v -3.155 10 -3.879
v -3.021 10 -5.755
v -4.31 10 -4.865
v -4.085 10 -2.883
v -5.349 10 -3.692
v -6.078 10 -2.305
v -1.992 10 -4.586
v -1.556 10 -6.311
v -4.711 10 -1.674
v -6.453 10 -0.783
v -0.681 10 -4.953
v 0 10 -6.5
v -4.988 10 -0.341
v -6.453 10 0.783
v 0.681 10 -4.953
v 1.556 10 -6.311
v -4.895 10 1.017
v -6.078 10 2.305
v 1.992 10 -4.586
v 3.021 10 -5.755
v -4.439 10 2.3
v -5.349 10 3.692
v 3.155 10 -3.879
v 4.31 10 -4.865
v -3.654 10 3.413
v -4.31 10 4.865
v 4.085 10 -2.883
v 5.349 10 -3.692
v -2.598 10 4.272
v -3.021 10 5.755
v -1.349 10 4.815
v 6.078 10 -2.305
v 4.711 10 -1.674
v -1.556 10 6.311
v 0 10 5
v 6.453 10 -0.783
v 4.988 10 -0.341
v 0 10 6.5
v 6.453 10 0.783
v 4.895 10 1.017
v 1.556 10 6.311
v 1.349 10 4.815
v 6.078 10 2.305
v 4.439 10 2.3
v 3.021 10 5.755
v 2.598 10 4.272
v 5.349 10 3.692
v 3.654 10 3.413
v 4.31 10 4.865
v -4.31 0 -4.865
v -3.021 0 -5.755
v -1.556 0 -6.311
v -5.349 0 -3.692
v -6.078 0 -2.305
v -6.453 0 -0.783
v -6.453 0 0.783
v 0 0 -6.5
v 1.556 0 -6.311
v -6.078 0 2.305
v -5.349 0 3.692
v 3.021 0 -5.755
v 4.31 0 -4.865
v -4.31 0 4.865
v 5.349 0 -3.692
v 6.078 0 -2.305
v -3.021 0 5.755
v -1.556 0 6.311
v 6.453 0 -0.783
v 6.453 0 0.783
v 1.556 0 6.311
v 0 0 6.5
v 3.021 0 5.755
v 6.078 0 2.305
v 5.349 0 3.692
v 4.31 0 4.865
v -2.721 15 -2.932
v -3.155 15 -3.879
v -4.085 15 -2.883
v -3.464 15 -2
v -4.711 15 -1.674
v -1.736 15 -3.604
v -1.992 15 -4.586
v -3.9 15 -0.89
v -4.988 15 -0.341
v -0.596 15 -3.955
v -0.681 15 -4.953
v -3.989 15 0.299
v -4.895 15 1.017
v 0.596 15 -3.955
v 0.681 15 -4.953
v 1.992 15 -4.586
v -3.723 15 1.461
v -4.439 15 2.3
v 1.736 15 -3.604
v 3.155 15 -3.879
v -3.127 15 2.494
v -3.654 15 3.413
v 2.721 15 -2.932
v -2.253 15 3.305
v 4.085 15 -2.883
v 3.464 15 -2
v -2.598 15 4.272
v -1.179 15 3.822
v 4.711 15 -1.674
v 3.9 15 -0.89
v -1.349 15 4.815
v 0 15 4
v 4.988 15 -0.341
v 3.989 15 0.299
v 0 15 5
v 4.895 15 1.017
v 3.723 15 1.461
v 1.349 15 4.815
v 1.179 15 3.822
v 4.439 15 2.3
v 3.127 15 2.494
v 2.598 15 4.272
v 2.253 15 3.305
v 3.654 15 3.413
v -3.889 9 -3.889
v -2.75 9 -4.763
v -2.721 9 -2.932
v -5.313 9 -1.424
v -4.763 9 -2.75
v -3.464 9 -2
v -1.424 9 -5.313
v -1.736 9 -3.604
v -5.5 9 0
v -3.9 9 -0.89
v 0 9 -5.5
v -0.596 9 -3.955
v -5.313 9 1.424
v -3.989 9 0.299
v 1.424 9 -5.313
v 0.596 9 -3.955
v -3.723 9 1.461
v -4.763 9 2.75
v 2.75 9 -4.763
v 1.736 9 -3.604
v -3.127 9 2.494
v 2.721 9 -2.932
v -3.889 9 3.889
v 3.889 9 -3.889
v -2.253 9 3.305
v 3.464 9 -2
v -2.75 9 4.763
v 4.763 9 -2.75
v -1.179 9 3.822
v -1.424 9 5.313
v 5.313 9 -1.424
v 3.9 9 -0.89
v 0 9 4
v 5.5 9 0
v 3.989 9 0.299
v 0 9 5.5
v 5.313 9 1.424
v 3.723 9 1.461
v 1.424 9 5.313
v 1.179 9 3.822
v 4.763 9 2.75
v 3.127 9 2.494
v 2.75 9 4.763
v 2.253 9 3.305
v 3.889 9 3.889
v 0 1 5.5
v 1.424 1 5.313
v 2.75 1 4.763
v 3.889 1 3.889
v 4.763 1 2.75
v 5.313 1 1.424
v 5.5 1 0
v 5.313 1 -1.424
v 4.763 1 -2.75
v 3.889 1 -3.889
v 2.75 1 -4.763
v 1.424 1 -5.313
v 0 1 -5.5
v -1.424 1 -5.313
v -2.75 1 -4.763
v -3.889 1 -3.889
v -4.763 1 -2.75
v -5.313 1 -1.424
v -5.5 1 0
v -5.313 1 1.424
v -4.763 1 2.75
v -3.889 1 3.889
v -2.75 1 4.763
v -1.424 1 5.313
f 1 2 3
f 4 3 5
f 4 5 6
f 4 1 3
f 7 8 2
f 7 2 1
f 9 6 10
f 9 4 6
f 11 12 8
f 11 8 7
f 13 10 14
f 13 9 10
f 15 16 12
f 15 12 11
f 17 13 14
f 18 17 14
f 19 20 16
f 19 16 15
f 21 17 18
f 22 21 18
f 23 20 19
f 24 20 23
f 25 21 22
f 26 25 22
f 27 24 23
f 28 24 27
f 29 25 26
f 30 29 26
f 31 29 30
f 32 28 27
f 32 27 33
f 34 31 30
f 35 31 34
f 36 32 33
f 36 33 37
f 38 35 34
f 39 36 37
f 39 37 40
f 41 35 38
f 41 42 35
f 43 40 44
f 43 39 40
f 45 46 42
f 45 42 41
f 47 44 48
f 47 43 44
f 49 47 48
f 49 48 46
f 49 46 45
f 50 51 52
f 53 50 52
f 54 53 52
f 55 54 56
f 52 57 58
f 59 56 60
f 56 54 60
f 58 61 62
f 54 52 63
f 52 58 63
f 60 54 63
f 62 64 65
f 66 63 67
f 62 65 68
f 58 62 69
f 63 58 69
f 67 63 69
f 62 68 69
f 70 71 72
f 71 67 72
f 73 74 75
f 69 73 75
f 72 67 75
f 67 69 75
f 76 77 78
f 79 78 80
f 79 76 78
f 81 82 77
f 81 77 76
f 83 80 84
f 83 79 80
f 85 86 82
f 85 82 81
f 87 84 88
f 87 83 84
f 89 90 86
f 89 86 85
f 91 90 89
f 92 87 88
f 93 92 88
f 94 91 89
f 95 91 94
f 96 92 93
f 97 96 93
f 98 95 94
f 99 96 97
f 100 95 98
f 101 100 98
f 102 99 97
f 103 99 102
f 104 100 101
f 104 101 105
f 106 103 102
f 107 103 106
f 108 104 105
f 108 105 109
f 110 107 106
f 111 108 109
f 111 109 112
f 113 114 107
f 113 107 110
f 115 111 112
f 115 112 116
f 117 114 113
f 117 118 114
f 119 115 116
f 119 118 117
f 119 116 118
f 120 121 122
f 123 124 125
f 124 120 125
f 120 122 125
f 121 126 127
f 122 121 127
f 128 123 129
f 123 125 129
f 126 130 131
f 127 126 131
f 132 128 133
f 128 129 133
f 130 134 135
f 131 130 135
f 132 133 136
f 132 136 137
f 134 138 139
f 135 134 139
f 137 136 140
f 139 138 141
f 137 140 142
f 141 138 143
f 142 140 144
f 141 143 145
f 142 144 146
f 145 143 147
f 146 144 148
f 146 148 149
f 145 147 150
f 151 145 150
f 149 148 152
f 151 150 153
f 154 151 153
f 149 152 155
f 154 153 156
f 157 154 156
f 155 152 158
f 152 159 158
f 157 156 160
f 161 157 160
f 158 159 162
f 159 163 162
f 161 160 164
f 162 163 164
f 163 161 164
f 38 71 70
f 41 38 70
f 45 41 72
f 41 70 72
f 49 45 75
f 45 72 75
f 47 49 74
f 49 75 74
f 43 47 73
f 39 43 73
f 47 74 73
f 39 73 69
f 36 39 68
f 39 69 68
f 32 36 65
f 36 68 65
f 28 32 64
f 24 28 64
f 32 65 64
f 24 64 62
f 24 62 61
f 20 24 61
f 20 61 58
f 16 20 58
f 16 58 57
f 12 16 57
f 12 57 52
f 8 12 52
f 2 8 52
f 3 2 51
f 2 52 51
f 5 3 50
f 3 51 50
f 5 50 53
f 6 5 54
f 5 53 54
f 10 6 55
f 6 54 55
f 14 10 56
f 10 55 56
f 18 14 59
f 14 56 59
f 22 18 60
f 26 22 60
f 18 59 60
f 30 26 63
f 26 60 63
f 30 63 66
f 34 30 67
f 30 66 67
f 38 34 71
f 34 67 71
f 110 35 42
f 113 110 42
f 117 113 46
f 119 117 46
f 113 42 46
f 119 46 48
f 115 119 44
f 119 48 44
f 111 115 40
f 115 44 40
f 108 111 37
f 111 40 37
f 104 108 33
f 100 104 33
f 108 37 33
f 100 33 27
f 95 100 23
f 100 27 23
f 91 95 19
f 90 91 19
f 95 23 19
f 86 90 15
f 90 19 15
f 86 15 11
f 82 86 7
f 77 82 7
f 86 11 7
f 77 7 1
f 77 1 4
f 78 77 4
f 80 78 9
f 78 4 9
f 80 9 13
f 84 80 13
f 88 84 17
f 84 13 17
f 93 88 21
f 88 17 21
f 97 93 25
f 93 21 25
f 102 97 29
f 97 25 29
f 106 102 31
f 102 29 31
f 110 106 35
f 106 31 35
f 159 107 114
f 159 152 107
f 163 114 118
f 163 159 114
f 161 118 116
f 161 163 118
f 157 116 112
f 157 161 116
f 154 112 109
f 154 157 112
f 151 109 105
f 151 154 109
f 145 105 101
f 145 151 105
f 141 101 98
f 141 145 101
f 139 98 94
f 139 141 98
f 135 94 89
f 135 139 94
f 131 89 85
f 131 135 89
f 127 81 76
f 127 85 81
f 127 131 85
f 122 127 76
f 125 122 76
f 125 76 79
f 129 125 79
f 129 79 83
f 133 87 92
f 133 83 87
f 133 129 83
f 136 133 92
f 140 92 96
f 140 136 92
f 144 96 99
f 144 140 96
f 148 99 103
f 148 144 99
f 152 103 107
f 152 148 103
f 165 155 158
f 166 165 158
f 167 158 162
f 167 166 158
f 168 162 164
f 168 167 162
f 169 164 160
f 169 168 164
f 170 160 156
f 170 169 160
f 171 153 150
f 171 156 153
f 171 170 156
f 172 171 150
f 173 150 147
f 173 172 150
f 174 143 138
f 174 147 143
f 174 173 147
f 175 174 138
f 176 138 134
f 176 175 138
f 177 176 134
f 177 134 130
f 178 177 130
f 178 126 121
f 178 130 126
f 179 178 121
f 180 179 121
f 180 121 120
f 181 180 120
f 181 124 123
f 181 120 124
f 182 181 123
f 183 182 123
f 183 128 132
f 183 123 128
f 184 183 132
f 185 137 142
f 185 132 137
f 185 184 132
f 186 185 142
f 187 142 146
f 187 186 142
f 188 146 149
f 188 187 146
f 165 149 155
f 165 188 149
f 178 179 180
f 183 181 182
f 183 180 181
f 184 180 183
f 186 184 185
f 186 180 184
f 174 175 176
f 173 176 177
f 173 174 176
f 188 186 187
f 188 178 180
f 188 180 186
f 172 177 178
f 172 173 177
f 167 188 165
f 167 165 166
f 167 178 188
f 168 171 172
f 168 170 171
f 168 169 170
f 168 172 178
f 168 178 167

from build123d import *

# Parameters (mm, degrees)
SKETCH1_R           = 6.5
BOSS_EXTRUDE1_DEPTH = 10
SKETCH2_R           = 5
BOSS_EXTRUDE2_DEPTH = 5
SHELL1_T            = -1


with BuildPart() as part:
    # Sketch1 → Boss-Extrude1 (new body)
    with BuildSketch(Plane(origin=(0, 0, 0), x_dir=(1, 0, 0), z_dir=(0, 1, 0))):
        with Locations(Location((0, 0, 0), (0, 0, 270))):
            Circle(SKETCH1_R)
    extrude(amount=BOSS_EXTRUDE1_DEPTH)

    # Sketch2 → Boss-Extrude2 (add)
    with BuildSketch(Plane(origin=(0, 10, 0), x_dir=(1, 0, 0), z_dir=(0, 1, 0))):
        with Locations(Location((0, 0, 0), (0, 0, 270))):
            Circle(SKETCH2_R)
    extrude(amount=BOSS_EXTRUDE2_DEPTH)

    # Shell1
    shell1_openings = [part.faces().sort_by_distance(p)[0] for p in [
        (0, 15, 0),
    ]]
    offset(amount=SHELL1_T, openings=shell1_openings, kind=Kind.INTERSECTION)


solid = part.part
